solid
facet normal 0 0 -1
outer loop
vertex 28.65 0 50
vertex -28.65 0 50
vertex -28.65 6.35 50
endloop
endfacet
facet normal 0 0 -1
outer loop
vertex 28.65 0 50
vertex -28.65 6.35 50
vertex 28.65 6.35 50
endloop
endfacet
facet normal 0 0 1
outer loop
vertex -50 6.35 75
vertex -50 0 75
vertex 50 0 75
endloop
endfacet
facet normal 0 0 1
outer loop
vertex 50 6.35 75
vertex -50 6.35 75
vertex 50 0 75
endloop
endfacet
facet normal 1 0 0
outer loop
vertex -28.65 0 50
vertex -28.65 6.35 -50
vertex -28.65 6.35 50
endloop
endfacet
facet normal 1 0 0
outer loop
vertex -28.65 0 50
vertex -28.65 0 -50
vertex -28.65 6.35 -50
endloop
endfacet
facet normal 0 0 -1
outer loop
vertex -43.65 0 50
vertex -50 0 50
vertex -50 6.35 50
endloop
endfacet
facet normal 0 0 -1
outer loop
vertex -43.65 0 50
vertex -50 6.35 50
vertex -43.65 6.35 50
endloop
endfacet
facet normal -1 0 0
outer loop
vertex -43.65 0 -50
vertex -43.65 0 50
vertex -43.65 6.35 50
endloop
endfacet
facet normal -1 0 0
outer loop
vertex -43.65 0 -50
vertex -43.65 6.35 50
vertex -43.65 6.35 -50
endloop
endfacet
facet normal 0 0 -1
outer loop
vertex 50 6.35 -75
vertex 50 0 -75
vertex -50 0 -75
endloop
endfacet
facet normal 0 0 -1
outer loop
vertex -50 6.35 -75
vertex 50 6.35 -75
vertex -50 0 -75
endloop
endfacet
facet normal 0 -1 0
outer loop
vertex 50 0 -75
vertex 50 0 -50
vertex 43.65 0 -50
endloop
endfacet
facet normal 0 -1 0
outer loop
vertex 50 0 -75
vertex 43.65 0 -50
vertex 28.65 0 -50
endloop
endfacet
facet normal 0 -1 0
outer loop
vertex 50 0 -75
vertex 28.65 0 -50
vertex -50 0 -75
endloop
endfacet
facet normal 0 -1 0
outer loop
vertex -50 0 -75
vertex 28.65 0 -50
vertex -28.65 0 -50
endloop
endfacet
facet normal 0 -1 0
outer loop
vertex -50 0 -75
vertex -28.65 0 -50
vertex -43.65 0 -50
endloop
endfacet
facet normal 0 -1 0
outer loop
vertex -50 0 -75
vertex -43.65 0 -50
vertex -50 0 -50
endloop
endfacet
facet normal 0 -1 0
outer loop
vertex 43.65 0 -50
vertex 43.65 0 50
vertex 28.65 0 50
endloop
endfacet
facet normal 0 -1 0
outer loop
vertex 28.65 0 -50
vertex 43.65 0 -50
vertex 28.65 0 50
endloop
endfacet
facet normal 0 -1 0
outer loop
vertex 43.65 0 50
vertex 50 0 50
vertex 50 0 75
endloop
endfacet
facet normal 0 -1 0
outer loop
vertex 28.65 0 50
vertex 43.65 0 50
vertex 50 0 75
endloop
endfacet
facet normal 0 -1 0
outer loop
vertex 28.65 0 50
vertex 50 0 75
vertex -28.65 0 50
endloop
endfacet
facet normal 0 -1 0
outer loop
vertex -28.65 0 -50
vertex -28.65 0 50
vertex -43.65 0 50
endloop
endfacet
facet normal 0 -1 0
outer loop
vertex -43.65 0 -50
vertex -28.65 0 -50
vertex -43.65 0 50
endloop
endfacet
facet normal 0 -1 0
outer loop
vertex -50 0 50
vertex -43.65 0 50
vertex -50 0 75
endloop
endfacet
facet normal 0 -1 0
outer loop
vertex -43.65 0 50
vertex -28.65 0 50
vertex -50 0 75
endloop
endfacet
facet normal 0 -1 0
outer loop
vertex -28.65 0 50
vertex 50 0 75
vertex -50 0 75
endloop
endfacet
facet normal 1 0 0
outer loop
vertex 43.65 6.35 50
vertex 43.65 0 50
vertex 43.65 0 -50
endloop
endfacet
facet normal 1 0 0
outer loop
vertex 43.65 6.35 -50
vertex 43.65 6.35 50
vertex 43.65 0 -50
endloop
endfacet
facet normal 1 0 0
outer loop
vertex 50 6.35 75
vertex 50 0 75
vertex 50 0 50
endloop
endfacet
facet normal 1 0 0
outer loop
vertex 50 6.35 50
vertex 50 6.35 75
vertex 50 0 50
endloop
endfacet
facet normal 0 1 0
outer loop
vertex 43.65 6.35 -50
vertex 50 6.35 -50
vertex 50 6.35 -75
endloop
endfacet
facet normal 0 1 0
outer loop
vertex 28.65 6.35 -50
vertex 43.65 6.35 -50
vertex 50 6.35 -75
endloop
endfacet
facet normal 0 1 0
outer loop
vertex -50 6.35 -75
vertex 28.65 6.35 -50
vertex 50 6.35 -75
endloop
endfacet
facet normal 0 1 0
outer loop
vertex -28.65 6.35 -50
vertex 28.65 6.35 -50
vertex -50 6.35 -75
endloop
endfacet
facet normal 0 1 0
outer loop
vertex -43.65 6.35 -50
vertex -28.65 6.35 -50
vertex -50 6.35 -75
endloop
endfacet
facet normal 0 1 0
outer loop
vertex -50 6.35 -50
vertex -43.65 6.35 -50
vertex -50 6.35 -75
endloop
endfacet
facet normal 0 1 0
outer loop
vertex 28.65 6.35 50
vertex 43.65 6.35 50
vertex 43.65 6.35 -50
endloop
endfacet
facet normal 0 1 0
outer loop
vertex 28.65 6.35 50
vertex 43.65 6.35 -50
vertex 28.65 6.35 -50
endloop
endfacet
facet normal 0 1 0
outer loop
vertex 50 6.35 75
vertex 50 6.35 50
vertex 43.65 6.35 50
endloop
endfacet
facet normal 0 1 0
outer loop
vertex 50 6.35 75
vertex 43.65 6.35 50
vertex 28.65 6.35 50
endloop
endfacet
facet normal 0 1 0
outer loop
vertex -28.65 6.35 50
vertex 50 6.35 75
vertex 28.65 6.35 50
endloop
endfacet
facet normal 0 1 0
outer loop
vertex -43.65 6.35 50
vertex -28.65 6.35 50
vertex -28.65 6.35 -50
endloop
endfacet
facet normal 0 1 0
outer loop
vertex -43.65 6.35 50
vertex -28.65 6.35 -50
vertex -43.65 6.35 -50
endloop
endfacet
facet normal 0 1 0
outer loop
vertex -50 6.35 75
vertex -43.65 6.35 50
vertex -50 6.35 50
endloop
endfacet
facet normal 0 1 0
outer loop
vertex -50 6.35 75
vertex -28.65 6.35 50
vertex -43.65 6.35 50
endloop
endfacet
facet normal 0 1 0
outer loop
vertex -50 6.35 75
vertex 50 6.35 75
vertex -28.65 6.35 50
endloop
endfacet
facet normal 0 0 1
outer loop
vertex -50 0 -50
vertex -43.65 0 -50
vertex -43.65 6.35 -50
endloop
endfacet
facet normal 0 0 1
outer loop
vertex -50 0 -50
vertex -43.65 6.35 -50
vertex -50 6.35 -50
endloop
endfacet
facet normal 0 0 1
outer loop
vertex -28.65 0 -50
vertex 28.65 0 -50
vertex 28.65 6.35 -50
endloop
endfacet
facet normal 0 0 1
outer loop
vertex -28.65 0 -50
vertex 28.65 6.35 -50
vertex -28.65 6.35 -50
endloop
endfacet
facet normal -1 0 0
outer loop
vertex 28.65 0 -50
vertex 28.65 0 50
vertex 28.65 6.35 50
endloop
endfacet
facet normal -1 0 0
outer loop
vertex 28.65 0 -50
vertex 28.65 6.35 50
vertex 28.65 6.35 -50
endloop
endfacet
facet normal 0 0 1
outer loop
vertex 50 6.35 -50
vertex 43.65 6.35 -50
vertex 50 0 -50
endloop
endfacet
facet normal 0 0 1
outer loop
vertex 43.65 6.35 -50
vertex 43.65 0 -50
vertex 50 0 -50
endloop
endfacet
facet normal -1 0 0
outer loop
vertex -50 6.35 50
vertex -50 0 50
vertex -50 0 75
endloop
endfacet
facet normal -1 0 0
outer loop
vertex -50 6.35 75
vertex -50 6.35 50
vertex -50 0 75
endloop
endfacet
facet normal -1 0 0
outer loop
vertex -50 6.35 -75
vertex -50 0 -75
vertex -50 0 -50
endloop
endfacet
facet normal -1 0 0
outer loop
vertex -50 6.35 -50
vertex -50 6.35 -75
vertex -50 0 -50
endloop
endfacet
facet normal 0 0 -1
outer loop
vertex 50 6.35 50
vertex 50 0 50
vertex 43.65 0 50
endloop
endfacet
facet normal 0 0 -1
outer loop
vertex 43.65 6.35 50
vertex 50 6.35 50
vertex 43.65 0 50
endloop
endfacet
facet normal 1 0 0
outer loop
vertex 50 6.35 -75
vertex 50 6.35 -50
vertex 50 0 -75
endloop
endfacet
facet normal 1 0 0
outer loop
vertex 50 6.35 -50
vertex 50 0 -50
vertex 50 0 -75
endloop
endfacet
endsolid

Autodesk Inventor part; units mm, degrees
ref_plane "YZ Plane" through (0, 0, 0) normal (1, 0, 0) x (0, 1, 0)
ref_plane "XZ Plane" through (0, 0, 0) normal (0, 1, 0) x (-1, 0, 0)
ref_plane "XY Plane" through (0, 0, 0) normal (0, 0, 1) x (1, 0, 0)
sketch "Sketch1" plane through (0, 0, 0) normal (0, 1, 0) x (-1, 0, 0)
  line L0 (50, 75) -> (-50, 75)
  line L1 (-50, -75) -> (50, -75)
  line L2 (50, 50) -> (43.65, 50)
  line L3 (43.65, 50) -> (43.65, -50)
  line L4 (43.65, -50) -> (50, -50)
  line L5 (-50, 50) -> (-43.65, 50)
  line L6 (-43.65, 50) -> (-43.65, -50)
  line L7 (-43.65, -50) -> (-50, -50)
  line L8 (50, -75) -> (50, -50)
  line L9 (50, 50) -> (50, 75)
  line L10 (-50, 75) -> (-50, 50)
  line L11 (-50, -50) -> (-50, -75)
  line L12 (28.65, 50) -> (-28.65, 50)
  line L13 (-28.65, 50) -> (-28.65, -50)
  line L14 (-28.65, -50) -> (28.65, -50)
  line L15 (28.65, -50) -> (28.65, 50)
  point P0 (0, 0)
  point P1 (50, 0)
  point P2 (0, -75)
  point P3 (43.65, 0)
  point P4 (28.65, 0)
  point P5 (0, -50)
  point P6 (0, 50)
  point P7 (46.825, 50)
  dimension "d1" = 150
  dimension "d5" = 25
  dimension "d6" = 25
  dimension "d7" = 6.35
  dimension "d8" = 6.35
  dimension "d9" = 100
  dimension "d10" = 100
  dimension "d11" = 6.35
  dimension "d12" = 15
extrude "Extrusion1" add sketch "Sketch1" along normal blind 6.35
properties part number "TopHolderV1"
